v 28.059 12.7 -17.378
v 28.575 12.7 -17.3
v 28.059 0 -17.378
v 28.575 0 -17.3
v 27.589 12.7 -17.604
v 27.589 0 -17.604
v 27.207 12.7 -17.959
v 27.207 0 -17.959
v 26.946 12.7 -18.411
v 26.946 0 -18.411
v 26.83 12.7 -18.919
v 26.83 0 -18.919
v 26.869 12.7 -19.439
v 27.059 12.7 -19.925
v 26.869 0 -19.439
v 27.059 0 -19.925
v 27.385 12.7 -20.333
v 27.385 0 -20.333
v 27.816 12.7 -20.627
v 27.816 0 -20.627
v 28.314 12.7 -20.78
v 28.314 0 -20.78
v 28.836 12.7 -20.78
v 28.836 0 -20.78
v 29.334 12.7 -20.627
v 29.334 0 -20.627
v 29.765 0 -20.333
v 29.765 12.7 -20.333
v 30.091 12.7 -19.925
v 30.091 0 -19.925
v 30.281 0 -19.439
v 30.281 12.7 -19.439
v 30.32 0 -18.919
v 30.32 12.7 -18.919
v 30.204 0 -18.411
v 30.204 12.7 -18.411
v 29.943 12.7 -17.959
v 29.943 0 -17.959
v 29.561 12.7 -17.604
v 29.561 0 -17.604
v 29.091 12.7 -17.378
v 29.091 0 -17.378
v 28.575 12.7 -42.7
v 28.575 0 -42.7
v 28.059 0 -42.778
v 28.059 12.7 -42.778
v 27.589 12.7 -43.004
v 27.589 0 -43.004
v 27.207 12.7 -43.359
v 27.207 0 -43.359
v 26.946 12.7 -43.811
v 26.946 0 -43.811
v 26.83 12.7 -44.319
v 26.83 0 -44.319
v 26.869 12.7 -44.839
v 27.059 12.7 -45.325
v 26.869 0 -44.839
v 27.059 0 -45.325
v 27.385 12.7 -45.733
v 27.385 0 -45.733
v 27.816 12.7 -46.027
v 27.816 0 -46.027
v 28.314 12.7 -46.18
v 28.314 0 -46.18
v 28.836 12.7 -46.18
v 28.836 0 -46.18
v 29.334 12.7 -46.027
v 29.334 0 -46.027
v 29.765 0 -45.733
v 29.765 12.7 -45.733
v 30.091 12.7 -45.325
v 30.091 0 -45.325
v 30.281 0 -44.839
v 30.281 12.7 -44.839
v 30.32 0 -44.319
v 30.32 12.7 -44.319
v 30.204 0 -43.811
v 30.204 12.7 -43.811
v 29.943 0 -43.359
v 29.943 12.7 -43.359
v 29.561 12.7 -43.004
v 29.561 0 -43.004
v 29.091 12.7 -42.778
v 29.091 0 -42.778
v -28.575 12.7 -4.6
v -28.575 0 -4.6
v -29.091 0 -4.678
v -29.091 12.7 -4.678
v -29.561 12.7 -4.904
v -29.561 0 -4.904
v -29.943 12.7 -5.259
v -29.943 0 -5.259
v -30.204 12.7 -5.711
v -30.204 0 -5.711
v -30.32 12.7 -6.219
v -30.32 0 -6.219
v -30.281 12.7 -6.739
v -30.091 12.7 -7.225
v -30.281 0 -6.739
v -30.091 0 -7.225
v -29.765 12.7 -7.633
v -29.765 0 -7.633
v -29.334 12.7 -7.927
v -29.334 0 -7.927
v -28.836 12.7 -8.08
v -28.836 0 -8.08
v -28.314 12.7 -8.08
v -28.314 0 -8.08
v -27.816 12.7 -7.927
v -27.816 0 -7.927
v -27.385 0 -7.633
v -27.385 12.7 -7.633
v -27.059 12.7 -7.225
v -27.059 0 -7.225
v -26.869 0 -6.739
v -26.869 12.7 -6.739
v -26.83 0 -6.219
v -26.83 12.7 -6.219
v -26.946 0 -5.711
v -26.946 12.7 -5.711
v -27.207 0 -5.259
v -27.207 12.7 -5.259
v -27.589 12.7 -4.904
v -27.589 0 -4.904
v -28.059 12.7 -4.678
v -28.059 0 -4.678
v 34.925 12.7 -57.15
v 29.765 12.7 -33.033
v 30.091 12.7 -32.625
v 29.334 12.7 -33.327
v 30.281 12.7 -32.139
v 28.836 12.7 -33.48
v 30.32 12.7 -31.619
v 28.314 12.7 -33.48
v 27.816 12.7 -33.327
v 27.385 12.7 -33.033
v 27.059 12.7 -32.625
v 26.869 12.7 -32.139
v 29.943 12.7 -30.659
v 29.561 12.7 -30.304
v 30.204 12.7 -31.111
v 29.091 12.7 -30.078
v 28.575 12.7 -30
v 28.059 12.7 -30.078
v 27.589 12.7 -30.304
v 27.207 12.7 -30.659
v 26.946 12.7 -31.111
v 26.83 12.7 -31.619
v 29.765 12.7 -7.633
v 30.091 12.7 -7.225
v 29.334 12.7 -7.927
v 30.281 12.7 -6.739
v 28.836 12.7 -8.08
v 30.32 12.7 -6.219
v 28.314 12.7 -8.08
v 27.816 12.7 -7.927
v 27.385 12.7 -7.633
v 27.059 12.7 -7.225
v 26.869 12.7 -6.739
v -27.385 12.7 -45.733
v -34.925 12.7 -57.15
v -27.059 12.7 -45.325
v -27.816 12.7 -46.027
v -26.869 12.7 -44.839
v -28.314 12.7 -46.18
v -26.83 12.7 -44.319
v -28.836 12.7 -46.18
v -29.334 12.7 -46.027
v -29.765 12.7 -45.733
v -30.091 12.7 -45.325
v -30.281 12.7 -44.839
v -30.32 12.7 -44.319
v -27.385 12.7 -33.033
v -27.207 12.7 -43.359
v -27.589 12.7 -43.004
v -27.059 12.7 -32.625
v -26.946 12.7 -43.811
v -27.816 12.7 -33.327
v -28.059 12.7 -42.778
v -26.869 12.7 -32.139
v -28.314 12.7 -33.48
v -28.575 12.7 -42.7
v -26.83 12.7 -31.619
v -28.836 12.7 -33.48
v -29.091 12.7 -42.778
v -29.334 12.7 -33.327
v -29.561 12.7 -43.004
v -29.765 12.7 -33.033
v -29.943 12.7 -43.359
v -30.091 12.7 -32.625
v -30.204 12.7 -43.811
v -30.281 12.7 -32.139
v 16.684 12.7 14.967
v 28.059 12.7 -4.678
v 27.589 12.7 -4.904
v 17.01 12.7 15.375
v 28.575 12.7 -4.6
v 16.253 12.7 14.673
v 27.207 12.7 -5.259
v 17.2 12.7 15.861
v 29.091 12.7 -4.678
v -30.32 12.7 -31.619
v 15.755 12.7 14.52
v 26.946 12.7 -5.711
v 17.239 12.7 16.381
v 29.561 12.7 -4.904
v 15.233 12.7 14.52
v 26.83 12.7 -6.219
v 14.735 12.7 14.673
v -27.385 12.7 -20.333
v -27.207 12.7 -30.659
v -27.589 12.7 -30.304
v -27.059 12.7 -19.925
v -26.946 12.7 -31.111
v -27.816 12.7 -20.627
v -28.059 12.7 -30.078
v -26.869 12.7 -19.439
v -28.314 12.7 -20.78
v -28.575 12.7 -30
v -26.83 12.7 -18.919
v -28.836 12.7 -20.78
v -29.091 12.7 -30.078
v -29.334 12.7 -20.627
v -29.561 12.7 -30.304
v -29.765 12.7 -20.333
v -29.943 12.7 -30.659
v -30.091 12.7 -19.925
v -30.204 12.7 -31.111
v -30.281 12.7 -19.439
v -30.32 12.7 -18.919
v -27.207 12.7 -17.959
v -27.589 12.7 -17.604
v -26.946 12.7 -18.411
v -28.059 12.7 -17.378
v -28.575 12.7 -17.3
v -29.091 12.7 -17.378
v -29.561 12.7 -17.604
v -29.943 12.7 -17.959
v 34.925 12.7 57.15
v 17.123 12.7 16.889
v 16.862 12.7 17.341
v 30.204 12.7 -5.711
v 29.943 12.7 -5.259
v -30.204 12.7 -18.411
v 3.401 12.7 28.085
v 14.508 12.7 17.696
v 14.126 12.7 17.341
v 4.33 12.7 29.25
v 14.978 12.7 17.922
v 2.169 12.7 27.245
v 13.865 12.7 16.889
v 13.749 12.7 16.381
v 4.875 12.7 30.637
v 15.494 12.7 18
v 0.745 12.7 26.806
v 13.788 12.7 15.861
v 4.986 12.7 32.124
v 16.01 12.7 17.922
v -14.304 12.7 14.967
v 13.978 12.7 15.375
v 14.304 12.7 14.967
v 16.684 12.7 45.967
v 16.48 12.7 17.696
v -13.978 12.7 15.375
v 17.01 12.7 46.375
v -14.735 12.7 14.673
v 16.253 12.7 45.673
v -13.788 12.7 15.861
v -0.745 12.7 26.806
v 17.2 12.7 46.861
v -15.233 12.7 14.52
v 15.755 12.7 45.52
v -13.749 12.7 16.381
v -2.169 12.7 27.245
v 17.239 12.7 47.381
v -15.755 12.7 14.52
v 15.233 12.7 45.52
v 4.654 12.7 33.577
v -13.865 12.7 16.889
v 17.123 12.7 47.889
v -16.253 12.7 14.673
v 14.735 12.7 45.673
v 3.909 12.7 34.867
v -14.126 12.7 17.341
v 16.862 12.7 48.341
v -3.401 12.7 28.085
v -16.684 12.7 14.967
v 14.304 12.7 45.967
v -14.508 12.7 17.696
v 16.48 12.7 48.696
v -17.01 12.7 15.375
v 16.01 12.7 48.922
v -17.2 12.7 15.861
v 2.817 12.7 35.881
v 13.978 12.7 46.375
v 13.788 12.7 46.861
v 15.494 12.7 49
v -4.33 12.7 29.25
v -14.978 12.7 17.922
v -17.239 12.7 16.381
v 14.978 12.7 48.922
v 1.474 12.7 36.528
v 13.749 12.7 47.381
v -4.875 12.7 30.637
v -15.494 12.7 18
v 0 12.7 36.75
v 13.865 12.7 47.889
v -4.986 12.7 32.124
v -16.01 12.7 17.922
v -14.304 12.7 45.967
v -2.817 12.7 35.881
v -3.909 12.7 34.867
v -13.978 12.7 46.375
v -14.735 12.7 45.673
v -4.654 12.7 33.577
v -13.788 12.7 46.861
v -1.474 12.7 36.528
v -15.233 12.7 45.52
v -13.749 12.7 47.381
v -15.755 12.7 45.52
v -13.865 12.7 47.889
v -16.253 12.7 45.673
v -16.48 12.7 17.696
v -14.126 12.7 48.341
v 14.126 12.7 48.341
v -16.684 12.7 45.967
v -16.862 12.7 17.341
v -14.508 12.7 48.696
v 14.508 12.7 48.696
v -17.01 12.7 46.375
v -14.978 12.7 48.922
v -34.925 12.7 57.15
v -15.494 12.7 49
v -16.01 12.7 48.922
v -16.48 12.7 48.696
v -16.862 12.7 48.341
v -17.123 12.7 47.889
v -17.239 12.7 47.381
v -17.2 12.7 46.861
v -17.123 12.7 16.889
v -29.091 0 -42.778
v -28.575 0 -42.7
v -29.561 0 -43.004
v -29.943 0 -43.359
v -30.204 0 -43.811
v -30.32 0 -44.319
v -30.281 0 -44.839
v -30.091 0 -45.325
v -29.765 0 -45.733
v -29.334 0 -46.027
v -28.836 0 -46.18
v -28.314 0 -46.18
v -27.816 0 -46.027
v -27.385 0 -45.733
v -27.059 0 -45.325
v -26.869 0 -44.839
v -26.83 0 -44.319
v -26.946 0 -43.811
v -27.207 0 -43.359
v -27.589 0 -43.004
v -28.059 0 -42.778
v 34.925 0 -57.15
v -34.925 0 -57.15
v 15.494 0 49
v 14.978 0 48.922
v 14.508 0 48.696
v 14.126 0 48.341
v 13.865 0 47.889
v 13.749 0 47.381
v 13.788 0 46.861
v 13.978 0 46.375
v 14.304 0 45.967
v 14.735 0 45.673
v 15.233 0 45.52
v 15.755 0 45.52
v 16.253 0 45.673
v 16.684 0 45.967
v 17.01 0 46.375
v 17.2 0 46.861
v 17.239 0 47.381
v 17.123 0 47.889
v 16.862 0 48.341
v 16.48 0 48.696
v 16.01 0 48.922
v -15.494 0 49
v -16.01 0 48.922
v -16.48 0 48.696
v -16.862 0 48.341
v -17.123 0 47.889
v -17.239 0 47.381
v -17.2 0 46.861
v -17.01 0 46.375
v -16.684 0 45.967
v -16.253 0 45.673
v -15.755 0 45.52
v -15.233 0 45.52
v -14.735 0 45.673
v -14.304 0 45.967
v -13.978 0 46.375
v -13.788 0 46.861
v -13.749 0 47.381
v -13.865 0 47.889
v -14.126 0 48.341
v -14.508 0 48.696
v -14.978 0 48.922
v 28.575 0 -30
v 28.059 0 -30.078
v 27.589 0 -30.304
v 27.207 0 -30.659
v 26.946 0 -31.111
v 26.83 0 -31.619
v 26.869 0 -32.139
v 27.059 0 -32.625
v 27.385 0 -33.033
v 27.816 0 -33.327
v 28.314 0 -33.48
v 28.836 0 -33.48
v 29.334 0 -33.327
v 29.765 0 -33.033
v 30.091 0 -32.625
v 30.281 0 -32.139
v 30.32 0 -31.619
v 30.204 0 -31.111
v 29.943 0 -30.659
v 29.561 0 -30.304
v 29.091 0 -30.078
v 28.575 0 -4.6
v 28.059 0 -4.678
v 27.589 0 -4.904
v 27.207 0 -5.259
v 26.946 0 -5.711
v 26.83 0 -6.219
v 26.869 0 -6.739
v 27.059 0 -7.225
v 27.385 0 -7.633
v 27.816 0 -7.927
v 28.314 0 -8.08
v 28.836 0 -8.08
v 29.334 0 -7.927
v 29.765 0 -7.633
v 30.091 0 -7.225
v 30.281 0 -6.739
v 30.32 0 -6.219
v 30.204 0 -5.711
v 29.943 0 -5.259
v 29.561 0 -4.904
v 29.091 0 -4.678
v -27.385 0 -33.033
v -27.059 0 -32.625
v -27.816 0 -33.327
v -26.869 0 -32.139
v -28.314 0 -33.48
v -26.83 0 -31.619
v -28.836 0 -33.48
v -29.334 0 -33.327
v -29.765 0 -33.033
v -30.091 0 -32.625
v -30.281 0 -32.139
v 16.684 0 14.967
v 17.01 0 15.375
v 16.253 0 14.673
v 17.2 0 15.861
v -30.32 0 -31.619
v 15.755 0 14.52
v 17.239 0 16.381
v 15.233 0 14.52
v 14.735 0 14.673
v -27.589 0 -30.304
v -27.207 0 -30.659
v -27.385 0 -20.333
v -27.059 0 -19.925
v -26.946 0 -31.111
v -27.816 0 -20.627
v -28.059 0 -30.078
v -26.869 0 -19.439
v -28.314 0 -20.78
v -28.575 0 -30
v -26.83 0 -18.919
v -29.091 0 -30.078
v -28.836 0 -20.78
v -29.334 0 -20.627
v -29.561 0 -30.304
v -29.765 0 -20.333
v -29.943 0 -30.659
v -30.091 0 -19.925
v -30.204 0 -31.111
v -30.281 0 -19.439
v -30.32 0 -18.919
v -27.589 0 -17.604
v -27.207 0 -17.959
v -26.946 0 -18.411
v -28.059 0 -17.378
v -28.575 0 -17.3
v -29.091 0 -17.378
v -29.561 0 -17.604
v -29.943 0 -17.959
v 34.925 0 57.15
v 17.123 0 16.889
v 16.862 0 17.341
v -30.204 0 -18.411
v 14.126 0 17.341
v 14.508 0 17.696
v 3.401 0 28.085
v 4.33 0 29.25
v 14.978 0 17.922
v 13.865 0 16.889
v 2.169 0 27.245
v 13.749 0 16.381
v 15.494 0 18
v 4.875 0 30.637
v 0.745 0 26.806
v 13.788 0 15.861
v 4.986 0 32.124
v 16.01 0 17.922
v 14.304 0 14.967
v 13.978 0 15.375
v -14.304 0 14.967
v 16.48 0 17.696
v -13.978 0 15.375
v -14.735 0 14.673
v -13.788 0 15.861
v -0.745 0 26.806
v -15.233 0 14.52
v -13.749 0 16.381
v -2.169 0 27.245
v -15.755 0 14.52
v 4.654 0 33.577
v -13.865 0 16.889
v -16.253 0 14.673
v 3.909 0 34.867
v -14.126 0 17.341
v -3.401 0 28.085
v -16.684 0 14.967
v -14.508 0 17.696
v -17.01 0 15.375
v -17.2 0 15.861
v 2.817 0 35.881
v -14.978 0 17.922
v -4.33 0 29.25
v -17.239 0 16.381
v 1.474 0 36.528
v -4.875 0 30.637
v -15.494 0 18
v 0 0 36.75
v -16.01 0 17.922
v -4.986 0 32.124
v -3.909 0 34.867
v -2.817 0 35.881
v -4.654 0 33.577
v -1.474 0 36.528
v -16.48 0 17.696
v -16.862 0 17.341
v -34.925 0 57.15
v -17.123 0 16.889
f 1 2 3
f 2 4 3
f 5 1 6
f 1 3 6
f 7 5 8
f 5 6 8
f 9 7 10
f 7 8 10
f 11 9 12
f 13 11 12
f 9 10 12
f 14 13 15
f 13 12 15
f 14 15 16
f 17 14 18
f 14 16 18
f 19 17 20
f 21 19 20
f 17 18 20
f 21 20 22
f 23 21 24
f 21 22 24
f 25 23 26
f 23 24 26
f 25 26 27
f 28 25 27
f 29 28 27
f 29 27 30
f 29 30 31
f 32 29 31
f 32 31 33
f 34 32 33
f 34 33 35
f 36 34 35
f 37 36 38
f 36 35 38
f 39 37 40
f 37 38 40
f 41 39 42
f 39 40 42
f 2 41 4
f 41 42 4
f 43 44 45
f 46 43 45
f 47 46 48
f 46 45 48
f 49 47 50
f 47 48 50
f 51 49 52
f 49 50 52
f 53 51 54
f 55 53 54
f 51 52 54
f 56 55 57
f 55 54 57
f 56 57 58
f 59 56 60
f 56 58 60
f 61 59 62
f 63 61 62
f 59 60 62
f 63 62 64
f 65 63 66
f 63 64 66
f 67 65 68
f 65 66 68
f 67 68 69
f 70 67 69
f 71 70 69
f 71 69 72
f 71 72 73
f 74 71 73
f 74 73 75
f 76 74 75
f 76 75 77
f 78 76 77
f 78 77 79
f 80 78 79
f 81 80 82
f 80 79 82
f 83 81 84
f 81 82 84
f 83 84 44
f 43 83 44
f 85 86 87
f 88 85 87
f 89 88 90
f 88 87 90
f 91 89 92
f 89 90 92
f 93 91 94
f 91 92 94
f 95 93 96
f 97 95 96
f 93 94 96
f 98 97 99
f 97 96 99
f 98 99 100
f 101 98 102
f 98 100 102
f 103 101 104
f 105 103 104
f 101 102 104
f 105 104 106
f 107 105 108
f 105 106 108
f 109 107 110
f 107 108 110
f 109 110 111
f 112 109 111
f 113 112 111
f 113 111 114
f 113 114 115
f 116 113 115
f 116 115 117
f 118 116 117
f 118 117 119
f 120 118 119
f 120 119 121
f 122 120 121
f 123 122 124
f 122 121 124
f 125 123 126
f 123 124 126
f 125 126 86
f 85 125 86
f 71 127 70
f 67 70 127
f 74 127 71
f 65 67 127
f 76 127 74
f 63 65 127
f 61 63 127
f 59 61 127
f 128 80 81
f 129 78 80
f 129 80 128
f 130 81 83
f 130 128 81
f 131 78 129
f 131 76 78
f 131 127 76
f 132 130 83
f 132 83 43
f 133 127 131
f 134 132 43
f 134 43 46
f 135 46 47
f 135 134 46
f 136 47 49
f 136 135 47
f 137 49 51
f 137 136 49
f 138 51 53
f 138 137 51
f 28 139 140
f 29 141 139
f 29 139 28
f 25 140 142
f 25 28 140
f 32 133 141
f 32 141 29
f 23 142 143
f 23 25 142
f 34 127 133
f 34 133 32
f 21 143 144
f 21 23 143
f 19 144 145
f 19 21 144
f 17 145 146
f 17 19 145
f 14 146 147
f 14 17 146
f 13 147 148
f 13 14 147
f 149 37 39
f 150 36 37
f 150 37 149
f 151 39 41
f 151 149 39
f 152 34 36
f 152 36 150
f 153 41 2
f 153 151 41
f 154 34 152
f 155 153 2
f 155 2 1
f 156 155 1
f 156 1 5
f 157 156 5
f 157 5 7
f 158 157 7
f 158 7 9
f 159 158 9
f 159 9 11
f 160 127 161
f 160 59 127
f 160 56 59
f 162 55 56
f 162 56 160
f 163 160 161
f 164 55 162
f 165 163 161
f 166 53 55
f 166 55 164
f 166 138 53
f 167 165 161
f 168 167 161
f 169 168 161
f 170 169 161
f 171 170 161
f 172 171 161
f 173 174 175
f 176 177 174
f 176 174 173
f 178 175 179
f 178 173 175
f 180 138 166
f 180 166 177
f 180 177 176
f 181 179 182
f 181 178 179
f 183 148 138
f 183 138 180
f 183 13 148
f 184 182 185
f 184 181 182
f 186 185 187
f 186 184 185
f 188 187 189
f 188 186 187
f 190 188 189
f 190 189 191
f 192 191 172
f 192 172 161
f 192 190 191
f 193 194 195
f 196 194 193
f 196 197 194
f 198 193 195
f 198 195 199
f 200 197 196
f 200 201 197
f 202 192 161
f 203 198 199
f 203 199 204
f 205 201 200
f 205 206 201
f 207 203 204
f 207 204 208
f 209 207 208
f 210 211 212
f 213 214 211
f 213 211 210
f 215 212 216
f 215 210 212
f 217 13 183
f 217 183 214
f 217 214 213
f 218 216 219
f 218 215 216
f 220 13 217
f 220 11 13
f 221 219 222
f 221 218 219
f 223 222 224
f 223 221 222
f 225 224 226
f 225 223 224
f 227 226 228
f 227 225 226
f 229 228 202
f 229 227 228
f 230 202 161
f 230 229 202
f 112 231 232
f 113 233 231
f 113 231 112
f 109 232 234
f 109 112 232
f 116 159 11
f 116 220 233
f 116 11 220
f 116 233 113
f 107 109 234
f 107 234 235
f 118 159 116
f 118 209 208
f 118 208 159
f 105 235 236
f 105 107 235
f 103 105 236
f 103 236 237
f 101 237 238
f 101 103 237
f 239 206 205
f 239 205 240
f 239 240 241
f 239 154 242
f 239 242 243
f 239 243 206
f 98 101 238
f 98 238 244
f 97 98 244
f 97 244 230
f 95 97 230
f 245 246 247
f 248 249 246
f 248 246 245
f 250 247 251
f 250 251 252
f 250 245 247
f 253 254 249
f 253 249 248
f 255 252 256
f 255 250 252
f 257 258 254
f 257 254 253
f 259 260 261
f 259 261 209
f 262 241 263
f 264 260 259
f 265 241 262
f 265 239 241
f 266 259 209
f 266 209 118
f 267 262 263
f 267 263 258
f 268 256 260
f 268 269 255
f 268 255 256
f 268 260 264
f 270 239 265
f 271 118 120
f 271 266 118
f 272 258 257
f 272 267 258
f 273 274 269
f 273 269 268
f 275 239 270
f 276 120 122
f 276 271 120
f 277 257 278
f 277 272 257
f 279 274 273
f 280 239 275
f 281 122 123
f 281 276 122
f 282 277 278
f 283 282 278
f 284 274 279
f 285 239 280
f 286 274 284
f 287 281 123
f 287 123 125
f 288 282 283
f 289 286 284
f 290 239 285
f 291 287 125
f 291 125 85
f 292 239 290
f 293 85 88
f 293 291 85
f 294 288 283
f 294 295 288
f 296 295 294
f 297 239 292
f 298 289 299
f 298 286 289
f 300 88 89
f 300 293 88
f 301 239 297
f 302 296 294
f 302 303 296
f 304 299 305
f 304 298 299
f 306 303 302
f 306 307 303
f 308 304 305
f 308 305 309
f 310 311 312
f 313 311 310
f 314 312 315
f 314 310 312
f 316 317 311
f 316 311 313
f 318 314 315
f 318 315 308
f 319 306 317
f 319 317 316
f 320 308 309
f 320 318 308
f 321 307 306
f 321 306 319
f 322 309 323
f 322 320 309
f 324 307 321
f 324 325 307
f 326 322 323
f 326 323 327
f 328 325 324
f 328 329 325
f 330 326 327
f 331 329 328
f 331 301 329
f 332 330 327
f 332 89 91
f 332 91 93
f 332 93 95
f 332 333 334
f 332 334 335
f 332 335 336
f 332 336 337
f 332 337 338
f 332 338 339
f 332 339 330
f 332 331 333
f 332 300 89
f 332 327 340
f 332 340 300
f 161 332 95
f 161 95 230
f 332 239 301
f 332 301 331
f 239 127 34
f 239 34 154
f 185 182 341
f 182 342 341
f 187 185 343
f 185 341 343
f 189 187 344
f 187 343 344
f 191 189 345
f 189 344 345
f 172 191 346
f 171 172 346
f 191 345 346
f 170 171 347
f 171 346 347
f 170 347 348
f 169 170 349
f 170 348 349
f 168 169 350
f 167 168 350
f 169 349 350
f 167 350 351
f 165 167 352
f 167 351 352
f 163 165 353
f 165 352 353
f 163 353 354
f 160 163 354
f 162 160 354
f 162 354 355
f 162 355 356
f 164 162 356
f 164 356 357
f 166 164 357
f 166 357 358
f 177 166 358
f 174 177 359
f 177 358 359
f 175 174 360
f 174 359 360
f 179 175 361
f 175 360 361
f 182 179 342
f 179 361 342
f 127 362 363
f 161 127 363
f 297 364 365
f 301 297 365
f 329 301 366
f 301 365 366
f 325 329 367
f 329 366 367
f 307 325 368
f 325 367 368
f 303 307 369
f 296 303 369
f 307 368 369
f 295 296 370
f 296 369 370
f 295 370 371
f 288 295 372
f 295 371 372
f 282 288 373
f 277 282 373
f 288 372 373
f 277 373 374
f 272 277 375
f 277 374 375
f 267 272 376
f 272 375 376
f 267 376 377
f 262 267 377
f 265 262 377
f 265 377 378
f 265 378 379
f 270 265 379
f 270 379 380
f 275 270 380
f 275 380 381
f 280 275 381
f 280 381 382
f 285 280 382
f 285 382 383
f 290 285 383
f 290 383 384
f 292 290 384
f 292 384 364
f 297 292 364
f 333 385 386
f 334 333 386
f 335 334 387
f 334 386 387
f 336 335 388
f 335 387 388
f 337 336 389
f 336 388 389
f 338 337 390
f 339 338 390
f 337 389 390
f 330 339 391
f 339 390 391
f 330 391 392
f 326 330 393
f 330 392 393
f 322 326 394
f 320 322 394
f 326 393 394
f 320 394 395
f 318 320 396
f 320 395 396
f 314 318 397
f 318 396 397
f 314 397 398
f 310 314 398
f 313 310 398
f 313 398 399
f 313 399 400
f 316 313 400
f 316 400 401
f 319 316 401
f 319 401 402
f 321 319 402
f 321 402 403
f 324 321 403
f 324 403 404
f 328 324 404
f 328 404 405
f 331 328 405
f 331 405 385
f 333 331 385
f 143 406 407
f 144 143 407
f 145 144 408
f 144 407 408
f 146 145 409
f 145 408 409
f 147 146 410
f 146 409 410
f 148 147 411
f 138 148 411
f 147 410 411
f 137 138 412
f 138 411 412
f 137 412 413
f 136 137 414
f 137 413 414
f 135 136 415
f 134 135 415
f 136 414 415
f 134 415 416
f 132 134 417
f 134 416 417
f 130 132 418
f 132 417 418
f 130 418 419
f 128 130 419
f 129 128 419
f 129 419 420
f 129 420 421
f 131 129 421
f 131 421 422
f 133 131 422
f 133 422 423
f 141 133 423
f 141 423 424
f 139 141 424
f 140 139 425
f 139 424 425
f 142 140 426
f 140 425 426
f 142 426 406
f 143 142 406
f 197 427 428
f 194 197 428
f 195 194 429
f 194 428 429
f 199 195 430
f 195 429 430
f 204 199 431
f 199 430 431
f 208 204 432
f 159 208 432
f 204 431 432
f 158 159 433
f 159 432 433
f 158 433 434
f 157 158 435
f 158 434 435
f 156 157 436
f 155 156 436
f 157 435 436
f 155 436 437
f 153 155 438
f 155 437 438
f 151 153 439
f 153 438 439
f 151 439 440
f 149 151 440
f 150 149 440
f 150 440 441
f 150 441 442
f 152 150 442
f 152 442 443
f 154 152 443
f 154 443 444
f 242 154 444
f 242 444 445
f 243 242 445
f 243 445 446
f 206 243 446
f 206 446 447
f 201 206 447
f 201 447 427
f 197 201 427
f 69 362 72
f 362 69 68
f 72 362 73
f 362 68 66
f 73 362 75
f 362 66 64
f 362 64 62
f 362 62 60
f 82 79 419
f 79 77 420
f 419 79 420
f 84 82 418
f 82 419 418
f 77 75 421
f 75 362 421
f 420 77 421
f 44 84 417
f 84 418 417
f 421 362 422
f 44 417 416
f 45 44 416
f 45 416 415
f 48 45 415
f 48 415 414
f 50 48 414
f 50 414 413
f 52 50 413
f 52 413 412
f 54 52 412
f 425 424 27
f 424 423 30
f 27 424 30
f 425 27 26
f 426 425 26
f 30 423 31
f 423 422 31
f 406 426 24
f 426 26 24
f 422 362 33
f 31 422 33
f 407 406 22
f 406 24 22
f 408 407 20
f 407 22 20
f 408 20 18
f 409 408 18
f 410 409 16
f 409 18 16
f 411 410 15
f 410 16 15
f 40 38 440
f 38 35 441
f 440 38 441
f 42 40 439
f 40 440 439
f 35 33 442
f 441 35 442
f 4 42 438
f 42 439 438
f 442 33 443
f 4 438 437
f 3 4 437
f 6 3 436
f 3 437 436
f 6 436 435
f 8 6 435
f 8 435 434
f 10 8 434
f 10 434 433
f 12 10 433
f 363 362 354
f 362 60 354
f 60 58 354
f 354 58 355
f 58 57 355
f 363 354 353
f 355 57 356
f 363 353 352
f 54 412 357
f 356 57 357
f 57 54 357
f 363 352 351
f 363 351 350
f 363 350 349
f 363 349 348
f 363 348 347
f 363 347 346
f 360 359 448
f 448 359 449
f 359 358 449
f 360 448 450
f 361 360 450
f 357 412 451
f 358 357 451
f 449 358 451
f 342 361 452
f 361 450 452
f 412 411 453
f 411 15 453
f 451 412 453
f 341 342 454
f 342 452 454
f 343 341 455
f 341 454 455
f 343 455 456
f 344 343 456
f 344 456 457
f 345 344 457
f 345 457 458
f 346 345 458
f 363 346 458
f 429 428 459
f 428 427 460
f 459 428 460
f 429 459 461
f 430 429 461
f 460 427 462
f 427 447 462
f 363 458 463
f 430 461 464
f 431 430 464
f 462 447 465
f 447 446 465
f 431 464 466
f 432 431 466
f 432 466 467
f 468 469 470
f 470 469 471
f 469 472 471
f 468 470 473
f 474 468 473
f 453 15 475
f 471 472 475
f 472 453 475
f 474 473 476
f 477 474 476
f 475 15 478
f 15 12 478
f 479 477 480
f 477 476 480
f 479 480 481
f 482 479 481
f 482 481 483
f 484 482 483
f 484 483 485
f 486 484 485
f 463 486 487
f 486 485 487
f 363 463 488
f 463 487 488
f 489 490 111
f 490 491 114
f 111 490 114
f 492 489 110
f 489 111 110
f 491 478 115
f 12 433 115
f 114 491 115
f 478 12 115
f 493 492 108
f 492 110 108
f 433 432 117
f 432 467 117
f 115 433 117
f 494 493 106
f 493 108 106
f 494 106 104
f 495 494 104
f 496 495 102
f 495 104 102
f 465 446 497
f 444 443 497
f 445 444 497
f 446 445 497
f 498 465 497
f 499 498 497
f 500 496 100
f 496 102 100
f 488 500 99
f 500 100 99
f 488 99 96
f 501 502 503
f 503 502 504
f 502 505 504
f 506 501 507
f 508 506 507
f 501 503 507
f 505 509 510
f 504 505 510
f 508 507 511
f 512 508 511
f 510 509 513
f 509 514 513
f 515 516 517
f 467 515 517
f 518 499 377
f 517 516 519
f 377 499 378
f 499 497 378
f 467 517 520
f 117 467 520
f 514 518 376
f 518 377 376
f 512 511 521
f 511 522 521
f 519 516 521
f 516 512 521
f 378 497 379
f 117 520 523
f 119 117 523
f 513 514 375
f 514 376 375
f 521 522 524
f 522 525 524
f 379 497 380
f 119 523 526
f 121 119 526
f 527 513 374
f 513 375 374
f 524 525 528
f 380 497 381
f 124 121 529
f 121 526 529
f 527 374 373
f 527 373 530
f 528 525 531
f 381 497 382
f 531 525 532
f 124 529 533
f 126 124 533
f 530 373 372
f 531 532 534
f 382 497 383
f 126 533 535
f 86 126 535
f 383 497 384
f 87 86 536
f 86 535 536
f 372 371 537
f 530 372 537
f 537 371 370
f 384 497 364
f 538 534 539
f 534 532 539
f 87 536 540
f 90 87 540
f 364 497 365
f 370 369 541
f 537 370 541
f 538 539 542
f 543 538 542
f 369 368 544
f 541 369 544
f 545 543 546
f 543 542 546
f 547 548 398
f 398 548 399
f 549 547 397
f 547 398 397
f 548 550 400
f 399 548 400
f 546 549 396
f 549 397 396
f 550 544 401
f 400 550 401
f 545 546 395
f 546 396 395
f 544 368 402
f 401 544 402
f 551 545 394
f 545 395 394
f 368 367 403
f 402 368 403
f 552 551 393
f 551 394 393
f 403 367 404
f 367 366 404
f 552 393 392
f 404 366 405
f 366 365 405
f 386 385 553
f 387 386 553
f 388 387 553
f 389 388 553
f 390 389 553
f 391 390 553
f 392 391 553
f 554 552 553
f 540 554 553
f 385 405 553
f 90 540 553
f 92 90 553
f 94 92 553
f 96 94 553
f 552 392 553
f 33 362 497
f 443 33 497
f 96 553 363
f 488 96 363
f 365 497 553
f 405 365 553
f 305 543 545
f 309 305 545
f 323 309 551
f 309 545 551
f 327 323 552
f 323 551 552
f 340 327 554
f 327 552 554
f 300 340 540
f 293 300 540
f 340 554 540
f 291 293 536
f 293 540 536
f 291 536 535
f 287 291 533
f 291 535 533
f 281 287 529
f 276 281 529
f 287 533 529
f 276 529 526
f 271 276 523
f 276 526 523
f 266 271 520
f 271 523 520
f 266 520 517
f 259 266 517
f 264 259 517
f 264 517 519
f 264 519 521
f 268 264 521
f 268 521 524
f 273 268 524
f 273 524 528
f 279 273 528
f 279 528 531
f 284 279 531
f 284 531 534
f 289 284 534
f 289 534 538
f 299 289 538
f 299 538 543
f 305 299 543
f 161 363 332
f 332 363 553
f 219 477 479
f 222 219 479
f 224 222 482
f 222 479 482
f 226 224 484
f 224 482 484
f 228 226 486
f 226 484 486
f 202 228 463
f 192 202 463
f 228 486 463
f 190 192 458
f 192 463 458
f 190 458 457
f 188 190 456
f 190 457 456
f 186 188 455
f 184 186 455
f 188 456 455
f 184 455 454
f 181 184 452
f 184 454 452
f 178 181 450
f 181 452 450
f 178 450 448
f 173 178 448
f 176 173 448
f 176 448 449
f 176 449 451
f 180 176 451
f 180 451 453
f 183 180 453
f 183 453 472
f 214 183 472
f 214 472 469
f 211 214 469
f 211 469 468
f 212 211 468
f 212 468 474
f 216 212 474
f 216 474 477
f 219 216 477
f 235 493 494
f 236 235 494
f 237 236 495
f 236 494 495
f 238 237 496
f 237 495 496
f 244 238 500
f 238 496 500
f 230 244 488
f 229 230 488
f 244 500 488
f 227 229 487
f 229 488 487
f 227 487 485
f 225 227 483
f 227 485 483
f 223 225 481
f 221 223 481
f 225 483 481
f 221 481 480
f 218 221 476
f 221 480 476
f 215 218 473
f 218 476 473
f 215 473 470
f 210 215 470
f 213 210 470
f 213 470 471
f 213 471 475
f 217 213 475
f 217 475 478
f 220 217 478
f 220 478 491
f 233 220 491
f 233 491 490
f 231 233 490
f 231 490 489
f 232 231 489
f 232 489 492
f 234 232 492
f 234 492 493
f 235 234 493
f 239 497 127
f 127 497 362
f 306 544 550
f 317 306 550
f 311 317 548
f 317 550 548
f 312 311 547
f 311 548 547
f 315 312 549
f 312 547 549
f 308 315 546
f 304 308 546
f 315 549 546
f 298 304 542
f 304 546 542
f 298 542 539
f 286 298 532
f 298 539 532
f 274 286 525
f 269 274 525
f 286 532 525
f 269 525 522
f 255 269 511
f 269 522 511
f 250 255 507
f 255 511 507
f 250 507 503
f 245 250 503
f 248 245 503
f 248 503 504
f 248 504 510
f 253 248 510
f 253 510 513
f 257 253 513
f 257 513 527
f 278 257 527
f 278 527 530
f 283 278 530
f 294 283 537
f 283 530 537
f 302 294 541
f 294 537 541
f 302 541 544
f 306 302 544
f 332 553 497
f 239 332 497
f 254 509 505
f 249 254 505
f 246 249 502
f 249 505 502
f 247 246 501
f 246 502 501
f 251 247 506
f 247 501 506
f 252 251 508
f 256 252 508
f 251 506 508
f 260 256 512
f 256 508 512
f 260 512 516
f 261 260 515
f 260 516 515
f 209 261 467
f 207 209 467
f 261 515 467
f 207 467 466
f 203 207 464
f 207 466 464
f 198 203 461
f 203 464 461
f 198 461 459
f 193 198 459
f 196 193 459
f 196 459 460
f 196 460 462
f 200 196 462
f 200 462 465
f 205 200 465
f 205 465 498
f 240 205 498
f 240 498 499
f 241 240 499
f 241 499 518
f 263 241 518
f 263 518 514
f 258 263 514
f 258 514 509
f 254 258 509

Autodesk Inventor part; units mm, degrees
ref_plane "YZ Plane" through (0, 0, 0) normal (1, 0, 0) x (0, 1, 0)
ref_plane "XZ Plane" through (0, 0, 0) normal (0, 1, 0) x (-1, 0, 0)
ref_plane "XY Plane" through (0, 0, 0) normal (0, 0, 1) x (1, 0, 0)
sketch "Sketch1" plane through (0, 0, 0) normal (0, 1, 0) x (-1, 0, 0)
  line L0 (-34.925, -57.15) -> (34.925, -57.15)
  line L1 (34.925, -57.15) -> (34.925, 57.15)
  line L2 (34.925, 57.15) -> (-34.925, 57.15)
  line L3 (-34.925, 57.15) -> (-34.925, -57.15)
  line L4 (-34.925, -57.15) -> (34.925, 57.15) construction
  line L5 (34.925, -57.15) -> (-34.925, 57.15) construction
  point P0 (0, 0)
  dimension "d0" = 69.85
  dimension "d1" = 114.3
extrude "Extrusion1" add sketch "Sketch1" along normal blind 12.7
sketch "Sketch2" plane through (0, 12.7, 0) normal (0, 1, 0) x (1, 0, 0)
  line L0 (0, 0) -> (0, -188.6697)
  line L1 (43.5518, -31.75) -> (-58.772, -31.75)
  line L2 (52.9625, 0) -> (-57.3554, 0)
  line L3 (-34.925, -57.15) -> (34.925, -57.15) projected
  point P0 (15.494, -47.25)
  point P1 (15.494, -16.25)
  point P2 (-15.494, -47.25)
  point P3 (-15.494, -16.25)
  point P4 (0, -31.75)
  dimension "d7" = 31
  dimension "d8" = 30.988
  dimension "d46" = 25.4
hole "Hole1" at (15.494, 12.7, 47.25) at (15.494, 12.7, 16.25) at (-15.494, 12.7, 16.25) at (-15.494, 12.7, 47.25) direction (0, -1, 0) diameter 3.5 end through all
sketch "Sketch4" plane through (0, 12.7, 0) normal (0, 1, 0) x (1, 0, 0)
  circle A0 centre (15.494, -16.25) radius 1.75 projected
  circle A1 centre (-15.494, -47.25) radius 1.75 projected
  line L0 (15.494, -16.25) -> (-15.494, -47.25)
  circle A2 centre (-15.494, -16.25) radius 1.75 projected
  circle A3 centre (15.494, -47.25) radius 1.75 projected
  line L1 (-15.494, -16.25) -> (15.494, -47.25)
  point P0 (0, 0)
  point P1 (0, -31.75)
hole "Hole2" at (0, 12.7, 31.75) direction (0, -1, 0) diameter 10 end through all
sketch "Sketch6" plane through (0, 12.7, 0) normal (0, 1, 0) x (1, 0, 0)
  line L0 (0, -77.2056) -> (0, 91.7239)
  line L1 (-28.575, 6.35) -> (-28.575, 44.45)
  line L2 (-34.925, 57.15) -> (-34.925, -57.15) projected
  line L3 (-34.925, 0) -> (-34.925, 57.15)
  line L4 (28.575, 6.35) -> (28.575, 44.45)
  line L5 (-64.5272, 0) -> (76.1693, 0)
  line L6 (34.925, 57.15) -> (-34.925, 57.15)
  line L7 (34.925, 57.15) -> (-34.925, 57.15) projected
  point P0 (0, 0)
  point P1 (-28.575, 19.05)
  point P2 (-28.575, 31.75)
  point P3 (28.575, 19.05)
  point P4 (28.575, 31.75)
  dimension "d29" = 12.7
  dimension "d30" = 12.7
  dimension "d31" = 12.7
  dimension "d34" = 6.35
  dimension "d44" = 12.7
hole "Hole3" at (-28.575, 12.7, -6.35) at (-28.575, 12.7, -19.05) at (-28.575, 12.7, -31.75) at (-28.575, 12.7, -44.45) at (28.575, 12.7, -44.45) at (28.575, 12.7, -31.75) at (28.575, 12.7, -19.05) at (28.575, 12.7, -6.35) direction (0, -1, 0) diameter 3.5 end through all
equation "\"d30\" = d29"
equation "\"d31\" = d30"
properties part number "Lead_Screw_Fixture_Base"
